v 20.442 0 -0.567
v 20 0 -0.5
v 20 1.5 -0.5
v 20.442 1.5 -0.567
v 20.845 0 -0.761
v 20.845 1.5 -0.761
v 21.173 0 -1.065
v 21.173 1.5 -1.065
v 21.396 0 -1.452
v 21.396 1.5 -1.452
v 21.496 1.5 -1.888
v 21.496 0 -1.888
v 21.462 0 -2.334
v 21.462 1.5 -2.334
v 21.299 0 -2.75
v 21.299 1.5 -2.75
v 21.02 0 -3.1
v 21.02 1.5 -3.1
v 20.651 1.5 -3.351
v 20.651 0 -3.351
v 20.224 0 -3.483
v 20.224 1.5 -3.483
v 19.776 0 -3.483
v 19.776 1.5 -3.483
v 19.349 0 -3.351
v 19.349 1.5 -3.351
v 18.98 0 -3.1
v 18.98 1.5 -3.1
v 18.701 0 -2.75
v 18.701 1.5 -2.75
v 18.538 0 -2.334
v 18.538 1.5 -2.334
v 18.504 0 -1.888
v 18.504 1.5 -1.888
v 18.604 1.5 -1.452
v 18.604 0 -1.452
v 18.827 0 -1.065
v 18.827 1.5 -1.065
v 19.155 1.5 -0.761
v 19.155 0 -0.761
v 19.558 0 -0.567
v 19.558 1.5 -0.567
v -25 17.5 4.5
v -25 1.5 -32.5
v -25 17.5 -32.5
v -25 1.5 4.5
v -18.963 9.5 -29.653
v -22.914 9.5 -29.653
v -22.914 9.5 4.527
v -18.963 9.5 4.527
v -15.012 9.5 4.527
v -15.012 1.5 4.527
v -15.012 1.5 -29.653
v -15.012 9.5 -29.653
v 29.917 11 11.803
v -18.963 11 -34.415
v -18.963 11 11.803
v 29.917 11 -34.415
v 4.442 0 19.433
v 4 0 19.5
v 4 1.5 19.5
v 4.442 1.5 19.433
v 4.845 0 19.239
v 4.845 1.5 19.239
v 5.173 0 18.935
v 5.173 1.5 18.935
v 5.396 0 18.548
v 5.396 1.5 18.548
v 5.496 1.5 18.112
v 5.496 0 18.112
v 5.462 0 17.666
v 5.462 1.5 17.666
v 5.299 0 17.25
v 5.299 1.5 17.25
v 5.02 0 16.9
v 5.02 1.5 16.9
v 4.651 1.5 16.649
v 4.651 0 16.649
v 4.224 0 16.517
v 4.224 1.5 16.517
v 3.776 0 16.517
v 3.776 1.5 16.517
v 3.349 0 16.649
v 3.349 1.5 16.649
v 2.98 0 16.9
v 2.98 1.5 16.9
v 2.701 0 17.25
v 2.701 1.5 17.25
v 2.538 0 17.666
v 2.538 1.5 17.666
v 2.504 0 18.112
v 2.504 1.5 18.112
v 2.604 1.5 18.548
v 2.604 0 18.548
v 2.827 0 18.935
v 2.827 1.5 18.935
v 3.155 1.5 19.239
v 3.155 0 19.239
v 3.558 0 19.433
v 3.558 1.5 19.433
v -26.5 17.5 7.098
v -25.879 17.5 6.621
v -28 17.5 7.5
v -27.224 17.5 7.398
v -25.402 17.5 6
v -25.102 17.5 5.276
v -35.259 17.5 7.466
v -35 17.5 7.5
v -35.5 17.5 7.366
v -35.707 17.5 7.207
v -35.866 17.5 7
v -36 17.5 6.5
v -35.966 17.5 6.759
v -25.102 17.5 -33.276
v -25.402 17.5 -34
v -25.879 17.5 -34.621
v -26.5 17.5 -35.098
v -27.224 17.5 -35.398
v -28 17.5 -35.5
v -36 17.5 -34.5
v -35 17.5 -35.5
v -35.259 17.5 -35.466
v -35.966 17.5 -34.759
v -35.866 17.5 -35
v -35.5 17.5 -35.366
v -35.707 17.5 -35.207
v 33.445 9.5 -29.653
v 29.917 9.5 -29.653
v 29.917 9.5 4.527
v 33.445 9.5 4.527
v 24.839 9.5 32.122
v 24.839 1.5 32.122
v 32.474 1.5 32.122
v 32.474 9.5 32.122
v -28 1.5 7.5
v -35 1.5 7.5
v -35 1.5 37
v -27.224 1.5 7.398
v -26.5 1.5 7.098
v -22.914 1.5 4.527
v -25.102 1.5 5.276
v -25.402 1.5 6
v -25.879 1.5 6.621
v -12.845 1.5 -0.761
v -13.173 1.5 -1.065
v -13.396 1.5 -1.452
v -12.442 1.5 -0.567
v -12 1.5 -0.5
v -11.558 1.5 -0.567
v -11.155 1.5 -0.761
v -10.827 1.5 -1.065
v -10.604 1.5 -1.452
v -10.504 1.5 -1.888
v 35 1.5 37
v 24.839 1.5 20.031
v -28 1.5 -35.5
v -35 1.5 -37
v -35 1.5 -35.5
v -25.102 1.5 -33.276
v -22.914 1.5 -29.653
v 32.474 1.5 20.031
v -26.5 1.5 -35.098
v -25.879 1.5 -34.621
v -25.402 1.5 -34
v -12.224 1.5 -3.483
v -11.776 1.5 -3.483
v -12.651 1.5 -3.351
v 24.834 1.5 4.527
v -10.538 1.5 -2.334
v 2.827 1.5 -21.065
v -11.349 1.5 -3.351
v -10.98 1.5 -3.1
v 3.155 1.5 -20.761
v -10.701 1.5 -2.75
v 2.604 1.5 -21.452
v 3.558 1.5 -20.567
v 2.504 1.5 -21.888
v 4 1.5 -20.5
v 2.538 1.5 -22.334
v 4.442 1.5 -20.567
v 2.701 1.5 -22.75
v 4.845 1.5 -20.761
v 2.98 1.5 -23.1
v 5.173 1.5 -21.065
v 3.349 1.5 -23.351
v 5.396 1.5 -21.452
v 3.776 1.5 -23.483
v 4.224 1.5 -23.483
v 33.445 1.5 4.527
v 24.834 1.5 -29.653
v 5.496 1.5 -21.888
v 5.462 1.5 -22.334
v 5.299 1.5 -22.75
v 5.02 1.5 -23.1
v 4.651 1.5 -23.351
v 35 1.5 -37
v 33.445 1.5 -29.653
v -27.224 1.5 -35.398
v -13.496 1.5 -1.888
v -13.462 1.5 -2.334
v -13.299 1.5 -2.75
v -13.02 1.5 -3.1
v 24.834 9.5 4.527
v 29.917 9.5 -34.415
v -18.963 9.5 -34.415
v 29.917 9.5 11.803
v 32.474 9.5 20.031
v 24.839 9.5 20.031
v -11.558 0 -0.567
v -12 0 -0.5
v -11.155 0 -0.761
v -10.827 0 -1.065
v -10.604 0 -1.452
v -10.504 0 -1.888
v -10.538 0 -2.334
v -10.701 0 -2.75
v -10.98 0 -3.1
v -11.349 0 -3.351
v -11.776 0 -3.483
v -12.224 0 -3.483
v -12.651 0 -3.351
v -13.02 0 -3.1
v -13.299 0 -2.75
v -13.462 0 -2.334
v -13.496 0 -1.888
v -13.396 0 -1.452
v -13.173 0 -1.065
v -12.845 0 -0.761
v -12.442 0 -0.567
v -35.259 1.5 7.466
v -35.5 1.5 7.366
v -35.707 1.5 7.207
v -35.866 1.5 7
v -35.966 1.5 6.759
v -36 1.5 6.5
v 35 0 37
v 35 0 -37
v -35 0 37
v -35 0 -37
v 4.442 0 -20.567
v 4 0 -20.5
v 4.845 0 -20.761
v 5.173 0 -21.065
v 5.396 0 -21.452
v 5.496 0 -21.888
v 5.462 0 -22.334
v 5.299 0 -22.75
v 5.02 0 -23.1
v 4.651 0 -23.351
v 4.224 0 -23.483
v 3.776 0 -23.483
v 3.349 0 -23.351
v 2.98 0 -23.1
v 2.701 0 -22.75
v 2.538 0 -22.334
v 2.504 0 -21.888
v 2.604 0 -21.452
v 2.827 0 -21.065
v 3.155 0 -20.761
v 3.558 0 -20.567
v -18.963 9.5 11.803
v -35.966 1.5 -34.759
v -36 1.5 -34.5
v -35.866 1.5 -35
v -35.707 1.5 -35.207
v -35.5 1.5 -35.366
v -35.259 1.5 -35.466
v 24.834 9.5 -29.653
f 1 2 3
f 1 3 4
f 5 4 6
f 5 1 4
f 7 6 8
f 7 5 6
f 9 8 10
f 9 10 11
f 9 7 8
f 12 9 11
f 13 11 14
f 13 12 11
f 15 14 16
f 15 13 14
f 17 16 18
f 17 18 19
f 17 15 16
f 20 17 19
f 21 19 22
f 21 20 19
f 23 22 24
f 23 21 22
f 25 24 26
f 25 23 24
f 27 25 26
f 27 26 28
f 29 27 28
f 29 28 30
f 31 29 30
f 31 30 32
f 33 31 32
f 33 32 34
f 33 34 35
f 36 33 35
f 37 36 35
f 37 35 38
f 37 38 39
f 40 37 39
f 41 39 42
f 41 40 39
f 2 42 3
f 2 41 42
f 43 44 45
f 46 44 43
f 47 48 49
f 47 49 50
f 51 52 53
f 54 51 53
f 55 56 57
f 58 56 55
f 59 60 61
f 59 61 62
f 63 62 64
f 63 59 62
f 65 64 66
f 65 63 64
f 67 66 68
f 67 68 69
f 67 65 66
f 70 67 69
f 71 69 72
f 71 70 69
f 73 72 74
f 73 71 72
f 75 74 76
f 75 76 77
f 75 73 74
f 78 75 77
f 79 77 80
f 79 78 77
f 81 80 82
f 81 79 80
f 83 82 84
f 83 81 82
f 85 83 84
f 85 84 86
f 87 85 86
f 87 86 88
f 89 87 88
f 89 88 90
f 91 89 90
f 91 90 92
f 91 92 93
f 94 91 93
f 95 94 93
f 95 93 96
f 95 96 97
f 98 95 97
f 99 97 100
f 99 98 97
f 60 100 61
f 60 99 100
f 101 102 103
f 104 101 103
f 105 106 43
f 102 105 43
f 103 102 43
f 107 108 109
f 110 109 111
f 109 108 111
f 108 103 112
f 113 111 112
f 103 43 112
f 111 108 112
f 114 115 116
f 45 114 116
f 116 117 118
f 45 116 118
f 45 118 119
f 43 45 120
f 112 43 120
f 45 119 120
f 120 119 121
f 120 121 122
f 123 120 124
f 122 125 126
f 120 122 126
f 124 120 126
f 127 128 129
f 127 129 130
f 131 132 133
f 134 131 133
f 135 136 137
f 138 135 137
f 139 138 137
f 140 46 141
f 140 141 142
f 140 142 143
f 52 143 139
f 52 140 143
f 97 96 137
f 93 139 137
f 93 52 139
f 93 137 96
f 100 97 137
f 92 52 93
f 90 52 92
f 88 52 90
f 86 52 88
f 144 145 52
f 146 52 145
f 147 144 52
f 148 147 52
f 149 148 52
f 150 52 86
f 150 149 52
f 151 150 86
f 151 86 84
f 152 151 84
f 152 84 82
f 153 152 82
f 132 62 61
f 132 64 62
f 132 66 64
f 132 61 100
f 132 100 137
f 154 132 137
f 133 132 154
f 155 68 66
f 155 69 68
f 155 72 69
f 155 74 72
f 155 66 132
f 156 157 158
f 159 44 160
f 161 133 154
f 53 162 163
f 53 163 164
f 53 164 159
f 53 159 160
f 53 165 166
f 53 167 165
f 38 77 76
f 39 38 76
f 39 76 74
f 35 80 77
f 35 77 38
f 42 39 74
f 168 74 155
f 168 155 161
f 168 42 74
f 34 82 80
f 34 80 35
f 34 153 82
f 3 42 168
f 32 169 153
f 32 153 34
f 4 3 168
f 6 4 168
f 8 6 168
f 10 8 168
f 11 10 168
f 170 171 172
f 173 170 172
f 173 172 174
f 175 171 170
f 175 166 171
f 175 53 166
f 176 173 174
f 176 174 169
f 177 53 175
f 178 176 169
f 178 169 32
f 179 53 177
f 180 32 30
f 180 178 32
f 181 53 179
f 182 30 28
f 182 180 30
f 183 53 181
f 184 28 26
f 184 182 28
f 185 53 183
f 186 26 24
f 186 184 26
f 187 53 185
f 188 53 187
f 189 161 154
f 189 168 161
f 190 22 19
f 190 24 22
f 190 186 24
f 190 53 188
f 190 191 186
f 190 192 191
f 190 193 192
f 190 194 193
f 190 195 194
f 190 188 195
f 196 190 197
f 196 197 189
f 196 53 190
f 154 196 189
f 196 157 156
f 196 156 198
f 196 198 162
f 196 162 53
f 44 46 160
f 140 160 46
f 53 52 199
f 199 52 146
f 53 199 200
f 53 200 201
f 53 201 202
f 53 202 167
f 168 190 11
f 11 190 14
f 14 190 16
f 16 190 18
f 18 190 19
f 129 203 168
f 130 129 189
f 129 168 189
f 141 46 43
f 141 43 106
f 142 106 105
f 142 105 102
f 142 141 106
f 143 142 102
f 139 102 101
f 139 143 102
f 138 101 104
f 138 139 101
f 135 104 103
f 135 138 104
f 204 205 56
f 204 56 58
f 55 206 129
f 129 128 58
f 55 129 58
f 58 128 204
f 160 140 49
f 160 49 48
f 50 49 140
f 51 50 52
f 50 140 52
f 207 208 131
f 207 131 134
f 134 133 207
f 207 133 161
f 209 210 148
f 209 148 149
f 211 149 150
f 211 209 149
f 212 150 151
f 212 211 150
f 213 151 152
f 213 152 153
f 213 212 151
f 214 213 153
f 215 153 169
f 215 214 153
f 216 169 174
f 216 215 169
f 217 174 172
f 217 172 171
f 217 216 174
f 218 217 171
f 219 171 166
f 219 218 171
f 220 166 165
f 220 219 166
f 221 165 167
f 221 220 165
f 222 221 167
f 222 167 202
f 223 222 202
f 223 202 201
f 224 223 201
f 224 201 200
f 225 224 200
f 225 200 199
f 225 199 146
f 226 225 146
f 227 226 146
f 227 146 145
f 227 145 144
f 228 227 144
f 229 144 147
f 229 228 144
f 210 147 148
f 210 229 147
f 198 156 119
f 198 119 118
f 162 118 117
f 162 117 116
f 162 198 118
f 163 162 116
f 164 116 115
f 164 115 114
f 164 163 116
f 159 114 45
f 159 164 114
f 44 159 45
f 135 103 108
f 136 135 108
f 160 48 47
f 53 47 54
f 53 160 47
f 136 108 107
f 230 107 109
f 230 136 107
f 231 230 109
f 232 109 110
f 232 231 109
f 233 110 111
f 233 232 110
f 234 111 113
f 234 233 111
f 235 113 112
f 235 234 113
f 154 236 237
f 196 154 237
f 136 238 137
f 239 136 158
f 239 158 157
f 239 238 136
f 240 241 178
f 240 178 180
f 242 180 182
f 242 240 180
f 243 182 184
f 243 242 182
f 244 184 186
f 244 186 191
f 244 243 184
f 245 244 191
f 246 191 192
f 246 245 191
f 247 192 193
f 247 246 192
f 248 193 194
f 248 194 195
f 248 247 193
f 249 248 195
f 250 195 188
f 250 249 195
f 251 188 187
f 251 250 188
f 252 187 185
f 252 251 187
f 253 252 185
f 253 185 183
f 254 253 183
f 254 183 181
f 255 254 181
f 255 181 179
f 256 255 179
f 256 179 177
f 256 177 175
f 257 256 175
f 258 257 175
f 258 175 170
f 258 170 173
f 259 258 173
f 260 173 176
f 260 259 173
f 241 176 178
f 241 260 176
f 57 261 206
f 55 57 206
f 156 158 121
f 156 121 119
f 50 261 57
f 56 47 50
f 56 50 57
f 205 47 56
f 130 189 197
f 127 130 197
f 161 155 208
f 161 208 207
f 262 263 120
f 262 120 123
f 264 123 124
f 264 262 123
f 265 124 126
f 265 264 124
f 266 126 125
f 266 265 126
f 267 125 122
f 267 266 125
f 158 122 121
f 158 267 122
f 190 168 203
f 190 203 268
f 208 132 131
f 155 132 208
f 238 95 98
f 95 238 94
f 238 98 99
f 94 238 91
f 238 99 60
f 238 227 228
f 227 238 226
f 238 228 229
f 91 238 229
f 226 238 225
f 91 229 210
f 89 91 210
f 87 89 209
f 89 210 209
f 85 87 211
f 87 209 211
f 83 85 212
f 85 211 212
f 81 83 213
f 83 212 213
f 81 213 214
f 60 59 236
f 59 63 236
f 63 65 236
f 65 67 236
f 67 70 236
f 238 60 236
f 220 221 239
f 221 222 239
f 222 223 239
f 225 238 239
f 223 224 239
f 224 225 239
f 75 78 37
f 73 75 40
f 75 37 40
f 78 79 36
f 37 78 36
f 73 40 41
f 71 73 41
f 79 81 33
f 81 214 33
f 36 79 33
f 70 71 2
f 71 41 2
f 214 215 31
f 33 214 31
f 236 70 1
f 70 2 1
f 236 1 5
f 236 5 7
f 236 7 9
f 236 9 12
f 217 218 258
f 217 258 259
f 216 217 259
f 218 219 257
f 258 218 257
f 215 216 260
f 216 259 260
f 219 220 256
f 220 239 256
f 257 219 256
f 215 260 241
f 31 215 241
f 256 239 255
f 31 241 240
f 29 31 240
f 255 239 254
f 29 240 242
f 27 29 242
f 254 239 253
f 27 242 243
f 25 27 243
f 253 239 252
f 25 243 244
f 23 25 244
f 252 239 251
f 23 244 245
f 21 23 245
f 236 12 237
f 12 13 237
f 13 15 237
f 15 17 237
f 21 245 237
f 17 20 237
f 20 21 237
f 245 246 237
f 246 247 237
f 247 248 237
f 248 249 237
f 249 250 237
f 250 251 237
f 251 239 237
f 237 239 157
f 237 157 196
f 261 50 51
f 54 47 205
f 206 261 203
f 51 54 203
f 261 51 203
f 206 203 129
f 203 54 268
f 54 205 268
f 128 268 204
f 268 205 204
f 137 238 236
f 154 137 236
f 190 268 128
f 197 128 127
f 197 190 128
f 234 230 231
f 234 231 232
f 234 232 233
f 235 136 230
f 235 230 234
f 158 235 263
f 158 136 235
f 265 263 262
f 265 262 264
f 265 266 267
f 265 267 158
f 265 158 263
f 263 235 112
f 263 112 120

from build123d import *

# Parameters (mm, degrees)
SKETCH_1_W      = 70
SKETCH_1_H      = 74
SKETCH_1_R      = 1.5
EXTRUDE_1_DEPTH = 1.5
EXTRUDE_2_DEPTH = 16
SKETCH_3_W      = 7.90187143
SKETCH_3_H      = 34.179510185
SKETCH_3_W_2    = 8.610784302
SKETCH_3_W_3    = 7.635032944
SKETCH_3_H_2    = 12.090105775
EXTRUDE_3_DEPTH = 8
SKETCH_4_W      = 48.879724418
SKETCH_4_H      = 46.217704607
EXTRUDE_4_DEPTH = 1.5


with BuildPart() as part:
    # 草图1 → 凸台-拉伸1 (new body)
    with BuildSketch(Plane(origin=(0, 0, 0), x_dir=(1, 0, 0), z_dir=(0, 1, 0))):
        Rectangle(SKETCH_1_W, SKETCH_1_H)
        with Locations(Location((4, 22, 0), (0, 0, 270))):
            Circle(SKETCH_1_R, mode=Mode.SUBTRACT)
        with Locations(Location((-12, 2, 0), (0, 0, 270))):
            Circle(SKETCH_1_R, mode=Mode.SUBTRACT)
        with Locations(Location((20, 2, 0), (0, 0, 270))):
            Circle(SKETCH_1_R, mode=Mode.SUBTRACT)
        with Locations(Location((4, -18, 0), (0, 0, 270))):
            Circle(SKETCH_1_R, mode=Mode.SUBTRACT)
    extrude(amount=EXTRUDE_1_DEPTH)

    # 草图2 → 凸台-拉伸2 (add)
    with BuildSketch(Plane(origin=(0, 1.5, 0), x_dir=(1, 0, 0), z_dir=(0, 1, 0))):
        with BuildLine():
            Line((-35, 35.5), (-28, 35.5))
            ThreePointArc((-28, 35.5), (-25.878679656, 34.621320344), (-25, 32.5))
            Line((-25, 32.5), (-25, -4.5))
            ThreePointArc((-25, -4.5), (-25.878679656, -6.621320344), (-28, -7.5))
            Line((-28, -7.5), (-35, -7.5))
            ThreePointArc((-35, -7.5), (-35.707106781, -7.207106781), (-36, -6.5))
            Line((-36, -6.5), (-36, 34.5))
            ThreePointArc((-36, 34.5), (-35.707106781, 35.207106781), (-35, 35.5))
        make_face()
    extrude(amount=EXTRUDE_2_DEPTH)

    # 草图3 → 凸台-拉伸3 (add)
    with BuildSketch(Plane(origin=(0, 1.5, 0), x_dir=(1, 0, 0), z_dir=(0, 1, 0))):
        with Locations((-18.962737702, 12.563109243)):
            Rectangle(SKETCH_3_W, SKETCH_3_H)
        with Locations((29.139365584, 12.563109243)):
            Rectangle(SKETCH_3_W_2, SKETCH_3_H)
        with Locations((28.656584238, -26.076525333)):
            Rectangle(SKETCH_3_W_3, SKETCH_3_H_2)
    extrude(amount=EXTRUDE_3_DEPTH)

    # 草图4 → 凸台-拉伸4 (add)
    with BuildSketch(Plane(origin=(0, 9.5, 0), x_dir=(1, 0, 0), z_dir=(0, 1, 0))):
        with Locations((5.477124507, 11.306310679)):
            Rectangle(SKETCH_4_W, SKETCH_4_H)
    extrude(amount=EXTRUDE_4_DEPTH)


solid = part.part
